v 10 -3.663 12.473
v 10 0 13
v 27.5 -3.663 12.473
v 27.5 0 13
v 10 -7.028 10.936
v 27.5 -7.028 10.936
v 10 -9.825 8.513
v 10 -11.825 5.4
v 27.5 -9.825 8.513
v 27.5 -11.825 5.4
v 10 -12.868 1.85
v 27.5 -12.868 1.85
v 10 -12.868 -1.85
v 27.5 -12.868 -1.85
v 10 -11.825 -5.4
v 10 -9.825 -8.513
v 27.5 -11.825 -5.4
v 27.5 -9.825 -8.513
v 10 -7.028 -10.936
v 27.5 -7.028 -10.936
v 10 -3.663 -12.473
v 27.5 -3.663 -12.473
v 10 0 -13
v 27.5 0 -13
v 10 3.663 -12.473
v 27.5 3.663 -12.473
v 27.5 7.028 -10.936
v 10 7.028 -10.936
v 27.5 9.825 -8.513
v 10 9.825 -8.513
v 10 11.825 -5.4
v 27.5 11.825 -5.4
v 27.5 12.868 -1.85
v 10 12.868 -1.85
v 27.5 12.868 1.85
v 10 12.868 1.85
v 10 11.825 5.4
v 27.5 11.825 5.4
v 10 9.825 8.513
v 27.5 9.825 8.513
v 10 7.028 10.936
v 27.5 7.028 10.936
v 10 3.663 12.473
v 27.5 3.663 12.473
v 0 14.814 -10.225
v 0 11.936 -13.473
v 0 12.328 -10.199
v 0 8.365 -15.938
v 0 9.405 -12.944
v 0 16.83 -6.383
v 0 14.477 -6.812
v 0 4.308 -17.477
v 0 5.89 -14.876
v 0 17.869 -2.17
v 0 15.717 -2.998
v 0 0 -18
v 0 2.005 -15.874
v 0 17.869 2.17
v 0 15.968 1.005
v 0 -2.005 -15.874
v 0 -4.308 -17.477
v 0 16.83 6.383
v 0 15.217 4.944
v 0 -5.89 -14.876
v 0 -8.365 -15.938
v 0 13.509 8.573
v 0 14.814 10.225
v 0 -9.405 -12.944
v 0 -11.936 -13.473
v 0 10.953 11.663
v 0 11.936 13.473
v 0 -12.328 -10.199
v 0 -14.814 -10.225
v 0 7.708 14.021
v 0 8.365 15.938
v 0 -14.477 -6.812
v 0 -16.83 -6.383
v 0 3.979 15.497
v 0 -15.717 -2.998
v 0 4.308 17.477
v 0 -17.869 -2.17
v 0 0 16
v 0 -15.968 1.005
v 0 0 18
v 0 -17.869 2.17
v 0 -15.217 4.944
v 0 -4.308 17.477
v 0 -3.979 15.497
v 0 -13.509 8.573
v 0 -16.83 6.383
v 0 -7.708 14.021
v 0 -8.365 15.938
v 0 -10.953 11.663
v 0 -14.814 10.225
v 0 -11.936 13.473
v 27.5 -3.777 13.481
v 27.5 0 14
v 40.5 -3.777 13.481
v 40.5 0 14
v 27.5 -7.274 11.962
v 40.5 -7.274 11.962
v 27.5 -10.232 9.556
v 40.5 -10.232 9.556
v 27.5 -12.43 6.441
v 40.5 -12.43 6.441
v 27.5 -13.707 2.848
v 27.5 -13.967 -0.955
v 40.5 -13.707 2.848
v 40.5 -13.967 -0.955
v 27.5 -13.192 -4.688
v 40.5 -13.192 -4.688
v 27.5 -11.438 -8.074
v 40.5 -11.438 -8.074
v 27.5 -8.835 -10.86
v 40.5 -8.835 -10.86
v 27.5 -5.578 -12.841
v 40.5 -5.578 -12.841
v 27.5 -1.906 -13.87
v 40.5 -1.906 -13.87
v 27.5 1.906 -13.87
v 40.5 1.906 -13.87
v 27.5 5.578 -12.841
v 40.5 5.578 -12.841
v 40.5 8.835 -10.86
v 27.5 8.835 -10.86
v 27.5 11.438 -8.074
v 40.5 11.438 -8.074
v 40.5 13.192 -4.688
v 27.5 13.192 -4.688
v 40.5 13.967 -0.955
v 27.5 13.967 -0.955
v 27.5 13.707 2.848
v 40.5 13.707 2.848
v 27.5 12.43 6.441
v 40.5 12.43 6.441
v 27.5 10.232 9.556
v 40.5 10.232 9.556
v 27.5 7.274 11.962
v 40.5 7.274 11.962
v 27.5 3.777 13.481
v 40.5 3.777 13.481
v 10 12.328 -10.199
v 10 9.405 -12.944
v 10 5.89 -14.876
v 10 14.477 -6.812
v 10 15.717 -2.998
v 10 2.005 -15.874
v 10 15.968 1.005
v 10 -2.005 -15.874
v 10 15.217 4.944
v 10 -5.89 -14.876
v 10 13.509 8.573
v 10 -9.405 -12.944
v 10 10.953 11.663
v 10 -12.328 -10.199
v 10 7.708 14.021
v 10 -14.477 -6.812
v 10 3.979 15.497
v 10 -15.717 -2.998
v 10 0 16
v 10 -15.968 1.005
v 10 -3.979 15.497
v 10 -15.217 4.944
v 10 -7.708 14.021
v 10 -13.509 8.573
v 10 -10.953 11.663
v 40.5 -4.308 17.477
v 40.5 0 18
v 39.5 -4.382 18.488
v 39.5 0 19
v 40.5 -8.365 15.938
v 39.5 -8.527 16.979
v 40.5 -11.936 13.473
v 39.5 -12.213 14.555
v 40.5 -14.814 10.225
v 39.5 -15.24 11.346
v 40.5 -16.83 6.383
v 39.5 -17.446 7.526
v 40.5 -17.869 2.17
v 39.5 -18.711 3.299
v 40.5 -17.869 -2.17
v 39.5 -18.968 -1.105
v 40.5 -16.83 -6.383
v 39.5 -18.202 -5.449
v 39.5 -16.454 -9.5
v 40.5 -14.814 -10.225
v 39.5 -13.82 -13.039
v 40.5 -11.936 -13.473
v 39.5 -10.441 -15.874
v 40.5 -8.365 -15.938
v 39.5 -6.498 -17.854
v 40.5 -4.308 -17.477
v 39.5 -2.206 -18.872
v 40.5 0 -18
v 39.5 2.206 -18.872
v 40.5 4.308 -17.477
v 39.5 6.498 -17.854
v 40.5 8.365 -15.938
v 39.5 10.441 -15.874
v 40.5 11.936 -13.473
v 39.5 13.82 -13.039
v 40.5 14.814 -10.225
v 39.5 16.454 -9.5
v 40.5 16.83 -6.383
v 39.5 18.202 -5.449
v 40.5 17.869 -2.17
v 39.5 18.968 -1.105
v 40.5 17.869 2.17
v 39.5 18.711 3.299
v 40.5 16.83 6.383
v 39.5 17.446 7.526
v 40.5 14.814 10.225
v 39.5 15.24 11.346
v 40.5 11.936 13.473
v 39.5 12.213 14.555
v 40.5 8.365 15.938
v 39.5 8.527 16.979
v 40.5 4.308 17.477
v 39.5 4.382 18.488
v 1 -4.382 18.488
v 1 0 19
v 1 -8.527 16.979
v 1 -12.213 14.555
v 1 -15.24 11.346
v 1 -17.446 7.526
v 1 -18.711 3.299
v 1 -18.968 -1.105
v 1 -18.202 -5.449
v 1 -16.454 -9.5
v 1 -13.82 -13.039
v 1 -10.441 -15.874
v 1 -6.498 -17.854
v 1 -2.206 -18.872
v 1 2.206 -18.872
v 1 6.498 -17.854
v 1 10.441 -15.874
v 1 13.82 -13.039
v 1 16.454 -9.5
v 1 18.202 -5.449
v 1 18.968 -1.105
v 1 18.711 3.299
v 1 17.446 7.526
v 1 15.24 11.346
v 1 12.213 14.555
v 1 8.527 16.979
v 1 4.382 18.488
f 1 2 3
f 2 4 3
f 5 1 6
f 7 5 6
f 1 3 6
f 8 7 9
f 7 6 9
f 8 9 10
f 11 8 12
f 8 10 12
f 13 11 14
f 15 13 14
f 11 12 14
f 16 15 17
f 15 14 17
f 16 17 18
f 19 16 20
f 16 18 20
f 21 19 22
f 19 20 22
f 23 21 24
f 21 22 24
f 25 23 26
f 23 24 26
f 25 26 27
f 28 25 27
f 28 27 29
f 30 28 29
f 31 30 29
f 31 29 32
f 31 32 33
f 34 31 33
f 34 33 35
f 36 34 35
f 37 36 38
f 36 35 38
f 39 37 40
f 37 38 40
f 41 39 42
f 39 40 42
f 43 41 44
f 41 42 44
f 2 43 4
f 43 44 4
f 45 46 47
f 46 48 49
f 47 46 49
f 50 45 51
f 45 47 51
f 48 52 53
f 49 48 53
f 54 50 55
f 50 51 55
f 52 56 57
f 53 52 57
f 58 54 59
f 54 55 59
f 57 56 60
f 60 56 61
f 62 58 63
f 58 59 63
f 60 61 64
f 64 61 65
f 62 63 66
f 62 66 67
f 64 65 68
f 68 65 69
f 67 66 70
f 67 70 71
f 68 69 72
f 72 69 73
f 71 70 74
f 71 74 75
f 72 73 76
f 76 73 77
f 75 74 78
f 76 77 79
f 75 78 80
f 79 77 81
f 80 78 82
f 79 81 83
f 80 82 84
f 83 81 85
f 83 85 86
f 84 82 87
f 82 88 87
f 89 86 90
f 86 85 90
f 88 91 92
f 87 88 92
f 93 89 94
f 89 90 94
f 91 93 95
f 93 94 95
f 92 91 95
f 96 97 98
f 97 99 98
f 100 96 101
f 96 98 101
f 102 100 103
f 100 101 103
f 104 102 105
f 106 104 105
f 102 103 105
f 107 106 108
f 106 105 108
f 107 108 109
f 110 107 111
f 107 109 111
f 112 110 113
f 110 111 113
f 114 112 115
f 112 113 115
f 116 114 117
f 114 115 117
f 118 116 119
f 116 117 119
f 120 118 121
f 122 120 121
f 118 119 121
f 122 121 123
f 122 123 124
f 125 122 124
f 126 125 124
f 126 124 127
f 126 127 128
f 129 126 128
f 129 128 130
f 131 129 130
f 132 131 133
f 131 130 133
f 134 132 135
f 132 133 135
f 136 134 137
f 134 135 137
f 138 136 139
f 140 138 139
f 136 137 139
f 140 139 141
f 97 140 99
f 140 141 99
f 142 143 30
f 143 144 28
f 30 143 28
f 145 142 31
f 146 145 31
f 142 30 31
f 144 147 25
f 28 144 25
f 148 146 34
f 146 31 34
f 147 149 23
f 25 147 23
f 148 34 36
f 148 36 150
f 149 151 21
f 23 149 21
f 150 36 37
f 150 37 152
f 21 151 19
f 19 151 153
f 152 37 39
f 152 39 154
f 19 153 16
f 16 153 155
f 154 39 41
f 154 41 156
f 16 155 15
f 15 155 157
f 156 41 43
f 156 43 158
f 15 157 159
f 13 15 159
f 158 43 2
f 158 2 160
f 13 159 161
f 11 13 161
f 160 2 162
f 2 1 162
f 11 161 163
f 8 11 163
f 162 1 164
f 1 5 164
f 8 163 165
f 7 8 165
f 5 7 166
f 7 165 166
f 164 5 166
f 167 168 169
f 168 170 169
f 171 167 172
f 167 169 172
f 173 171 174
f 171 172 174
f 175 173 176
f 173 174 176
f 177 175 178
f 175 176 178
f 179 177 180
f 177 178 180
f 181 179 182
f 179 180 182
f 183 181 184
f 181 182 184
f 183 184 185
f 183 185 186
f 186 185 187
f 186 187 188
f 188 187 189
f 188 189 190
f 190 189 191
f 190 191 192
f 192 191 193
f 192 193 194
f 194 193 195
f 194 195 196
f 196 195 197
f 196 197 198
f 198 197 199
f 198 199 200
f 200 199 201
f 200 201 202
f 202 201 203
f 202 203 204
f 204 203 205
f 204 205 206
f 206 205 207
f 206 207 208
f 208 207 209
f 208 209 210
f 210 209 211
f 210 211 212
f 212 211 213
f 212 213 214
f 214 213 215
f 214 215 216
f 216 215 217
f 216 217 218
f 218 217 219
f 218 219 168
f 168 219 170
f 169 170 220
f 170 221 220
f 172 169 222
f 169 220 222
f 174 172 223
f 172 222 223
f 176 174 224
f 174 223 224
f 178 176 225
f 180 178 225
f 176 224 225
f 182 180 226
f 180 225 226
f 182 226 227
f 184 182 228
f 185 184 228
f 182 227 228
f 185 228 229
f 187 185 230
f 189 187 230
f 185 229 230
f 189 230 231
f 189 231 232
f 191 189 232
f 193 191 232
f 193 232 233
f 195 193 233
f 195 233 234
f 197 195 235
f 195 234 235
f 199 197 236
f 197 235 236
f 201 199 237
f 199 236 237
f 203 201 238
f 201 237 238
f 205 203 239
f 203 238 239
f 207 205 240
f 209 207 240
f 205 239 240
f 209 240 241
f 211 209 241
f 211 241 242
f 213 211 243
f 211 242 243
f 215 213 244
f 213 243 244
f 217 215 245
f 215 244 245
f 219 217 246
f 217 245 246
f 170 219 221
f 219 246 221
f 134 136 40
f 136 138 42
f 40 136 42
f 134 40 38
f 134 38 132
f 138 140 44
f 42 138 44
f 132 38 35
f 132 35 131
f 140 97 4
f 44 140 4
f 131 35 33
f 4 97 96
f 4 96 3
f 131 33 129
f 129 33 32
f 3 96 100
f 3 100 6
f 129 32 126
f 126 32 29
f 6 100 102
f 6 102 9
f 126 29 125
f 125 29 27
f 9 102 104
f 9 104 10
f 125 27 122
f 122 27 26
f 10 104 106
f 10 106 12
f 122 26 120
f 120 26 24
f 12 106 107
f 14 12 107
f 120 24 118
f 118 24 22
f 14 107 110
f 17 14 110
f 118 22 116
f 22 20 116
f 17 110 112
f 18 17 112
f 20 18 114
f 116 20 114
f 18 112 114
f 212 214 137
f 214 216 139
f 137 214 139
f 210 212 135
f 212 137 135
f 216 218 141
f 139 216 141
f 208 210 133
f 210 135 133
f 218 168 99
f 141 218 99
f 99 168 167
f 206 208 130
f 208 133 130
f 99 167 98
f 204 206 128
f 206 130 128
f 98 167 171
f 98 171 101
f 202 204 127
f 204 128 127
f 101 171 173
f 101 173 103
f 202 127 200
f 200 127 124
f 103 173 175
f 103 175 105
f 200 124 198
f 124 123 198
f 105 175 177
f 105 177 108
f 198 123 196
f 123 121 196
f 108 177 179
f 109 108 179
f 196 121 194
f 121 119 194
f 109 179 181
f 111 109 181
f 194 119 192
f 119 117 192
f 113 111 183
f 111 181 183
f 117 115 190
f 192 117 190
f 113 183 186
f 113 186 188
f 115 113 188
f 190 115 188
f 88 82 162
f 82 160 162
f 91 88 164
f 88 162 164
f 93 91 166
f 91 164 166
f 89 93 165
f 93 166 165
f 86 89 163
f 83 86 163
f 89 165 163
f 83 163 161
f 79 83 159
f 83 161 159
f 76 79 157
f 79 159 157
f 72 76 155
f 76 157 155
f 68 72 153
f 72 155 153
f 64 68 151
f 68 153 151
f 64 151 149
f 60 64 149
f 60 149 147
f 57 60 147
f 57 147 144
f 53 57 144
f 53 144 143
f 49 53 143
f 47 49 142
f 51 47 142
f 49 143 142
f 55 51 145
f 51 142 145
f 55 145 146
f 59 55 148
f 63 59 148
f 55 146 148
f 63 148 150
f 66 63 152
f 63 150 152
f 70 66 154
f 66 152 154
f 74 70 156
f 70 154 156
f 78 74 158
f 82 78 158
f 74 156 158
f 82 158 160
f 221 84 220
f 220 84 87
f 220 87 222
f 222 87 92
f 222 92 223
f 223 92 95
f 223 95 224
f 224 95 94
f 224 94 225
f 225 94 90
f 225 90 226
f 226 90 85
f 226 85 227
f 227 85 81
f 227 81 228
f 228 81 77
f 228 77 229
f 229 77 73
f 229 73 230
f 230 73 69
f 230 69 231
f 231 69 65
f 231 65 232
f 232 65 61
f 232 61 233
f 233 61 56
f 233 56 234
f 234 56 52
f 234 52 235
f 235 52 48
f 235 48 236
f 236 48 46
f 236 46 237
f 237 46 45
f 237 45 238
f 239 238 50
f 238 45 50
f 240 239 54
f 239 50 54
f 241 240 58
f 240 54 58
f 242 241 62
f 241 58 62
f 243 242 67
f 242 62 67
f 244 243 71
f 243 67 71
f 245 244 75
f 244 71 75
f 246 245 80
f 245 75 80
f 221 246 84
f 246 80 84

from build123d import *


with BuildPart() as part:
    # Esquisse1 → Base-Révolution (revolve)
    with BuildSketch(Plane.XY, mode=Mode.PRIVATE) as base_r_volution_sk:
        Polygon((0, 18), (0, 16), (10, 16), (10, 13), (27.5, 13), (27.5, 14), (40.5, 14), (40.5, 18), (39.5, 19), (1, 19), align=None)
    revolve(base_r_volution_sk.sketch.rotate(Axis((0, 0, 0), (1, 0, 0)), 90), axis=Axis((0, 0, 0), (1, 0, 0)))


solid = part.part
